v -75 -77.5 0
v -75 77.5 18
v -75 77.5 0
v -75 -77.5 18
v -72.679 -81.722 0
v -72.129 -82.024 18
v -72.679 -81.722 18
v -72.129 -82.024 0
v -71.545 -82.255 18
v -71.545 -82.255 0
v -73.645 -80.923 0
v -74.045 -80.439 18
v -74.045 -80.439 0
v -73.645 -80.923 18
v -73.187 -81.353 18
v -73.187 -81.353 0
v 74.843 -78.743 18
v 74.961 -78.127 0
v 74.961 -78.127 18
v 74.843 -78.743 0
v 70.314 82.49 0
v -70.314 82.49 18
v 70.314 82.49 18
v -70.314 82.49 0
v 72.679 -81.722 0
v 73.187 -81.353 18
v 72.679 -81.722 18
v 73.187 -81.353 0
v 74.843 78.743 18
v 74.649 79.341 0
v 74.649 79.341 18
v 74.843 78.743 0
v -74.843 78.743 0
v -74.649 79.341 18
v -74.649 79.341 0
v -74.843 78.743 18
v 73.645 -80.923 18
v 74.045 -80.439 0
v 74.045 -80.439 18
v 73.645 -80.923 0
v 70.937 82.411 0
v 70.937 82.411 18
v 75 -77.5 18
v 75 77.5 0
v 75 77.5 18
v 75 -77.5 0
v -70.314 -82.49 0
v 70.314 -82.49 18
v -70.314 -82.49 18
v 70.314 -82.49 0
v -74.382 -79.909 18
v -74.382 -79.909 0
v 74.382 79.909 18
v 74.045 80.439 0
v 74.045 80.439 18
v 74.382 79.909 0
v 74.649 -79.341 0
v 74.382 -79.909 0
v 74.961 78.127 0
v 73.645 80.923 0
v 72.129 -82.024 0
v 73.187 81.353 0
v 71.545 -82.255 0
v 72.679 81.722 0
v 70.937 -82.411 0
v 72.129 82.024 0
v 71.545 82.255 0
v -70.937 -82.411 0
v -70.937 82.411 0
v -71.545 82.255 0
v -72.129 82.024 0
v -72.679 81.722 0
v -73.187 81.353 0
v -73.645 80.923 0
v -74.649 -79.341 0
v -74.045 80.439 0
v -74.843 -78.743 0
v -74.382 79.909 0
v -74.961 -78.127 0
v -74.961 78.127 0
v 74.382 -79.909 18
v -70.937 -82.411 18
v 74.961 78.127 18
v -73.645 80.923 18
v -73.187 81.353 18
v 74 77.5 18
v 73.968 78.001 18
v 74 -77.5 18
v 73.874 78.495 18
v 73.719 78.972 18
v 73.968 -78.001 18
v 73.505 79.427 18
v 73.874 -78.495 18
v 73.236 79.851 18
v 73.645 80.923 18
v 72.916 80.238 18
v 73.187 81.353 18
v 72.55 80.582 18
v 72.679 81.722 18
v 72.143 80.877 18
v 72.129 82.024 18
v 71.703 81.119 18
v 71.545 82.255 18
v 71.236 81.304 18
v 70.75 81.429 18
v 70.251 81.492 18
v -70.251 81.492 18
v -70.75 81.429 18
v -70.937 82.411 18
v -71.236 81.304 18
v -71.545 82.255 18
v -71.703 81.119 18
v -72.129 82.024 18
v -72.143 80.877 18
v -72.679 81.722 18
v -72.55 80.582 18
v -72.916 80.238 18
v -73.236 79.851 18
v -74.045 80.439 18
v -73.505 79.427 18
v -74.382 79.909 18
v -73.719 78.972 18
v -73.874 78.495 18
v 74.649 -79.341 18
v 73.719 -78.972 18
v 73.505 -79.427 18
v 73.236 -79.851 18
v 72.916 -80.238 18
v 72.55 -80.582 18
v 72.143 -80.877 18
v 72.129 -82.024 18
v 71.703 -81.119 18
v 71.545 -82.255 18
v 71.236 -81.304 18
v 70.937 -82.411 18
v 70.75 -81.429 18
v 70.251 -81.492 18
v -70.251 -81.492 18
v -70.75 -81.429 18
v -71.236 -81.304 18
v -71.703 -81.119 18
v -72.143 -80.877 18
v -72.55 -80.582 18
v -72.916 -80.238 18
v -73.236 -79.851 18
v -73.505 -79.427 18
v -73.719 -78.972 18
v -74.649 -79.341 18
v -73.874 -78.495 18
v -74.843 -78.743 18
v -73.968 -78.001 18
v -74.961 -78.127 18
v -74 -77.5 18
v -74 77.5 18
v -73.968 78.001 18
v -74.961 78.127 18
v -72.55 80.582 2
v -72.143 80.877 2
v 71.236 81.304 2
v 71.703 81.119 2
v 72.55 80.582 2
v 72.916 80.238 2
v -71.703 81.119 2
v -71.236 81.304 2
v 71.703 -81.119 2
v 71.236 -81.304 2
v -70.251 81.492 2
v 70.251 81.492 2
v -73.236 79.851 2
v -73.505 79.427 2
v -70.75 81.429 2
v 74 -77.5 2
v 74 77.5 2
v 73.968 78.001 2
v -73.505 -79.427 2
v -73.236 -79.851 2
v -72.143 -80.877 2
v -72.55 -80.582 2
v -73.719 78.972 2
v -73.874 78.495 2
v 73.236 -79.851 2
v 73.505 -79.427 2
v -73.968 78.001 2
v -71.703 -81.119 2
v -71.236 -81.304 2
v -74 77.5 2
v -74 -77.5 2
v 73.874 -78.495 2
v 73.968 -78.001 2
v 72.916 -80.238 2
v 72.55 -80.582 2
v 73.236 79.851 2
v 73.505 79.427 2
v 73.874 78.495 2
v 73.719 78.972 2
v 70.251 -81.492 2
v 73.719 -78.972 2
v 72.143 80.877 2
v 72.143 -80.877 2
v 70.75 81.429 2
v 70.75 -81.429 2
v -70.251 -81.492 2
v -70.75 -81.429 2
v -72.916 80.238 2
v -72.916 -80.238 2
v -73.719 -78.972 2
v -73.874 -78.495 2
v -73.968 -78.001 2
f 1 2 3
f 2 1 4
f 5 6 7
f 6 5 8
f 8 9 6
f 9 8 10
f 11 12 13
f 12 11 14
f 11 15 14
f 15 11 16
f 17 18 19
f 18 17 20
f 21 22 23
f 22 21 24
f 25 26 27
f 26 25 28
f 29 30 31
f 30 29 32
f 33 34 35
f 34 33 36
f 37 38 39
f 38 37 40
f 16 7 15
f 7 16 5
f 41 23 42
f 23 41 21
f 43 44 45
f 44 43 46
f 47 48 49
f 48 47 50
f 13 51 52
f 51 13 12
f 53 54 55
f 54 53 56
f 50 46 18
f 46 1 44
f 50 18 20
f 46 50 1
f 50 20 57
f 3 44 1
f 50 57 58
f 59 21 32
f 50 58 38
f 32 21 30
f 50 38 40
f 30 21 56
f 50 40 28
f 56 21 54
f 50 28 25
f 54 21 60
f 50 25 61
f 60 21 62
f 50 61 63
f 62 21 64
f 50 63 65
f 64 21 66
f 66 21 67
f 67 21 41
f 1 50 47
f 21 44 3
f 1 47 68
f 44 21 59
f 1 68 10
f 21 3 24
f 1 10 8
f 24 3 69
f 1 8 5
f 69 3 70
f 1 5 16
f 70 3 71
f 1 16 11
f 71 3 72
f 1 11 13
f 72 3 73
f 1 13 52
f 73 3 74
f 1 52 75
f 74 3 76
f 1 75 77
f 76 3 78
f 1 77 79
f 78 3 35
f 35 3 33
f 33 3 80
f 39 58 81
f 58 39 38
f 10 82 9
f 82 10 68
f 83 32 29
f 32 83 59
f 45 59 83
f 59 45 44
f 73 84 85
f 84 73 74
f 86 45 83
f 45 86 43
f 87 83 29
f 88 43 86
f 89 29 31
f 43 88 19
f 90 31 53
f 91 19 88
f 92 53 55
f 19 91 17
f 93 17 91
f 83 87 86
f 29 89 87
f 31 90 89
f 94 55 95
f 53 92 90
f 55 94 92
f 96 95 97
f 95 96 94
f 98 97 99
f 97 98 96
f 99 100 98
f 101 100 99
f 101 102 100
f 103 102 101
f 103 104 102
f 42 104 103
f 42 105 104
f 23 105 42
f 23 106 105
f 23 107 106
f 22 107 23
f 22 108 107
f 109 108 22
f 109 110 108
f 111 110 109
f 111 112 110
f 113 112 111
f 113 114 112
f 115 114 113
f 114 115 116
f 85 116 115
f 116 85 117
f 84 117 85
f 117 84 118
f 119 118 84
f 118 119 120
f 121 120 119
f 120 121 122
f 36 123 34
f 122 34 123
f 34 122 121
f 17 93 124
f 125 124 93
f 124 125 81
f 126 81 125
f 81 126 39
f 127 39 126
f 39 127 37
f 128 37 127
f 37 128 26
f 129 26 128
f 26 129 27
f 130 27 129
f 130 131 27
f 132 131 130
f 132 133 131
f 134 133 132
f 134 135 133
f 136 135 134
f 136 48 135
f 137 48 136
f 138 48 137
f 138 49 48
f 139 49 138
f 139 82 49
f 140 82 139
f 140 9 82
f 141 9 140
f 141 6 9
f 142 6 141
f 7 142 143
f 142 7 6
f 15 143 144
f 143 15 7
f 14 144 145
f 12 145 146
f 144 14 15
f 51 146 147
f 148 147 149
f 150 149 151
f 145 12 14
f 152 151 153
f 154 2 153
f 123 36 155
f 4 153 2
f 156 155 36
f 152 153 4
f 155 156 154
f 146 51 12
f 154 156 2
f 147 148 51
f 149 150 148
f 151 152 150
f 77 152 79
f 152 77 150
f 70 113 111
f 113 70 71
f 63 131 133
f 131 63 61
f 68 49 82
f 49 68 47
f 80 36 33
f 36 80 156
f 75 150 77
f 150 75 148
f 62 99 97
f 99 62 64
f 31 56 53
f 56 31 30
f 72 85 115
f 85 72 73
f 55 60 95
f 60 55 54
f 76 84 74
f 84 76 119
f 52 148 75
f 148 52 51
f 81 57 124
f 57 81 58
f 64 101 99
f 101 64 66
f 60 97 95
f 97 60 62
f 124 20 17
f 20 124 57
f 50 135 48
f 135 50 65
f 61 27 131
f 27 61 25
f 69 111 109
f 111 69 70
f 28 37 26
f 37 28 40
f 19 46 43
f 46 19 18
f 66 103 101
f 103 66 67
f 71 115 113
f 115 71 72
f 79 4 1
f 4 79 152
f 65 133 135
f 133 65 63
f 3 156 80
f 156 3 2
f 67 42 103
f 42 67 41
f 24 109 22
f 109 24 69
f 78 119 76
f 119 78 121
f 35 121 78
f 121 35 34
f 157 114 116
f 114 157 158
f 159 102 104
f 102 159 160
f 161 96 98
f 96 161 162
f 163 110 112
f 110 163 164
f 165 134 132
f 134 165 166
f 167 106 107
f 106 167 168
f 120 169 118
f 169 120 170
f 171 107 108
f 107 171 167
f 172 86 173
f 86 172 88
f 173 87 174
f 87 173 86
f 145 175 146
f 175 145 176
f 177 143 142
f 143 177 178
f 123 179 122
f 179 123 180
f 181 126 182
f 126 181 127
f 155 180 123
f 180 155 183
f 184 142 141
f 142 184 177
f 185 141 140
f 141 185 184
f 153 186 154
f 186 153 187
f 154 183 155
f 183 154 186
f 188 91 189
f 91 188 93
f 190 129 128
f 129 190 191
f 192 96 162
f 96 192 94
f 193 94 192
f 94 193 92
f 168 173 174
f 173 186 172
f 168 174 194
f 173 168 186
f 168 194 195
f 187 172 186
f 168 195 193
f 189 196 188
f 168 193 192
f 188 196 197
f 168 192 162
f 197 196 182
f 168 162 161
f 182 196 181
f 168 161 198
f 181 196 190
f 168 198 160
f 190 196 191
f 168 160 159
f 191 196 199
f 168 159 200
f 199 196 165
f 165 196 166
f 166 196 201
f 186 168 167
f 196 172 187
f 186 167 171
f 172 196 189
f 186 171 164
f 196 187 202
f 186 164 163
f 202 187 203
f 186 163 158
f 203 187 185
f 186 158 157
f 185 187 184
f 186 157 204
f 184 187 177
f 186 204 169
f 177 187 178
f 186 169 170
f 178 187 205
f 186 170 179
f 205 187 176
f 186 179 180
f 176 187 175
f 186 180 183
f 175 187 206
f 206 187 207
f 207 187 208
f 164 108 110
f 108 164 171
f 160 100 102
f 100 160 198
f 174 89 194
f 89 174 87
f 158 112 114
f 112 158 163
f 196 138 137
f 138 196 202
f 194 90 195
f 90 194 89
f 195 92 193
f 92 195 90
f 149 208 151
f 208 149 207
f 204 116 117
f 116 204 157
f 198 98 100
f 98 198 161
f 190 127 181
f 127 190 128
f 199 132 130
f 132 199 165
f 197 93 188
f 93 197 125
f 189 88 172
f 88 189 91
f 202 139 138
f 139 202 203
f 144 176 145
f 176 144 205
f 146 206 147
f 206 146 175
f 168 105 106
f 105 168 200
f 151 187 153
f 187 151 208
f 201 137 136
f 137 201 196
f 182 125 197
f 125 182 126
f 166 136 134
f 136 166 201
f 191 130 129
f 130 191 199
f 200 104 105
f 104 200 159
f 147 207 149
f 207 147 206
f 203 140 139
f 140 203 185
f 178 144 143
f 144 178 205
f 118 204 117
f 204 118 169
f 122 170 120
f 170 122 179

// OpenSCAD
$fn = 50;


difference() {
	union() {
		hull() {
			translate(v = [-70.0000000000, 77.5000000000, 0]) {
				cylinder(h = 18, r = 5);
			}
			translate(v = [70.0000000000, 77.5000000000, 0]) {
				cylinder(h = 18, r = 5);
			}
			translate(v = [-70.0000000000, -77.5000000000, 0]) {
				cylinder(h = 18, r = 5);
			}
			translate(v = [70.0000000000, -77.5000000000, 0]) {
				cylinder(h = 18, r = 5);
			}
		}
	}
	union() {
		translate(v = [0, 0, 2]) {
			hull() {
				translate(v = [-70.0000000000, 77.5000000000, 0]) {
					cylinder(h = 16, r = 4);
				}
				translate(v = [70.0000000000, 77.5000000000, 0]) {
					cylinder(h = 16, r = 4);
				}
				translate(v = [-70.0000000000, -77.5000000000, 0]) {
					cylinder(h = 16, r = 4);
				}
				translate(v = [70.0000000000, -77.5000000000, 0]) {
					cylinder(h = 16, r = 4);
				}
			}
		}
	}
}
